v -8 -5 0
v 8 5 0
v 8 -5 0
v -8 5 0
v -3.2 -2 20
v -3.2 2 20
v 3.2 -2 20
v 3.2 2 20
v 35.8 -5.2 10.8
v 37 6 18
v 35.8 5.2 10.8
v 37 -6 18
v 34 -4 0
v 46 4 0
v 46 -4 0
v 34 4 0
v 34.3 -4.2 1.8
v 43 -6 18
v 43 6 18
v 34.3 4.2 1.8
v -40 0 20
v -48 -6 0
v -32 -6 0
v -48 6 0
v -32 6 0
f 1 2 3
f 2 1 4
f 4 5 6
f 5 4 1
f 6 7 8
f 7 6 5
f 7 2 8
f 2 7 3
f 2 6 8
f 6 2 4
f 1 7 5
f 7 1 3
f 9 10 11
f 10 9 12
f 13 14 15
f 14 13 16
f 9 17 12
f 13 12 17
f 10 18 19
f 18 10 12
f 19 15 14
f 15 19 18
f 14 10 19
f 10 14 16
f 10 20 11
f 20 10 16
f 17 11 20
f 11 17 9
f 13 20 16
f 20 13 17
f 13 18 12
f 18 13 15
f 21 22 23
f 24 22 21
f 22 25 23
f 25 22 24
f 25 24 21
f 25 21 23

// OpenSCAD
// linear_extrude(scale=) is a ruled loft between two similar sections — exact
linear_extrude(height = 20, scale = 0.4) square([16, 10], center = true);
translate([40, 0, 0]) linear_extrude(height = 18, scale = [0.5, 1.5]) square([12, 8], center = true);
translate([-40, 0, 0]) linear_extrude(height = 20, scale = 0) square([16, 12], center = true);
